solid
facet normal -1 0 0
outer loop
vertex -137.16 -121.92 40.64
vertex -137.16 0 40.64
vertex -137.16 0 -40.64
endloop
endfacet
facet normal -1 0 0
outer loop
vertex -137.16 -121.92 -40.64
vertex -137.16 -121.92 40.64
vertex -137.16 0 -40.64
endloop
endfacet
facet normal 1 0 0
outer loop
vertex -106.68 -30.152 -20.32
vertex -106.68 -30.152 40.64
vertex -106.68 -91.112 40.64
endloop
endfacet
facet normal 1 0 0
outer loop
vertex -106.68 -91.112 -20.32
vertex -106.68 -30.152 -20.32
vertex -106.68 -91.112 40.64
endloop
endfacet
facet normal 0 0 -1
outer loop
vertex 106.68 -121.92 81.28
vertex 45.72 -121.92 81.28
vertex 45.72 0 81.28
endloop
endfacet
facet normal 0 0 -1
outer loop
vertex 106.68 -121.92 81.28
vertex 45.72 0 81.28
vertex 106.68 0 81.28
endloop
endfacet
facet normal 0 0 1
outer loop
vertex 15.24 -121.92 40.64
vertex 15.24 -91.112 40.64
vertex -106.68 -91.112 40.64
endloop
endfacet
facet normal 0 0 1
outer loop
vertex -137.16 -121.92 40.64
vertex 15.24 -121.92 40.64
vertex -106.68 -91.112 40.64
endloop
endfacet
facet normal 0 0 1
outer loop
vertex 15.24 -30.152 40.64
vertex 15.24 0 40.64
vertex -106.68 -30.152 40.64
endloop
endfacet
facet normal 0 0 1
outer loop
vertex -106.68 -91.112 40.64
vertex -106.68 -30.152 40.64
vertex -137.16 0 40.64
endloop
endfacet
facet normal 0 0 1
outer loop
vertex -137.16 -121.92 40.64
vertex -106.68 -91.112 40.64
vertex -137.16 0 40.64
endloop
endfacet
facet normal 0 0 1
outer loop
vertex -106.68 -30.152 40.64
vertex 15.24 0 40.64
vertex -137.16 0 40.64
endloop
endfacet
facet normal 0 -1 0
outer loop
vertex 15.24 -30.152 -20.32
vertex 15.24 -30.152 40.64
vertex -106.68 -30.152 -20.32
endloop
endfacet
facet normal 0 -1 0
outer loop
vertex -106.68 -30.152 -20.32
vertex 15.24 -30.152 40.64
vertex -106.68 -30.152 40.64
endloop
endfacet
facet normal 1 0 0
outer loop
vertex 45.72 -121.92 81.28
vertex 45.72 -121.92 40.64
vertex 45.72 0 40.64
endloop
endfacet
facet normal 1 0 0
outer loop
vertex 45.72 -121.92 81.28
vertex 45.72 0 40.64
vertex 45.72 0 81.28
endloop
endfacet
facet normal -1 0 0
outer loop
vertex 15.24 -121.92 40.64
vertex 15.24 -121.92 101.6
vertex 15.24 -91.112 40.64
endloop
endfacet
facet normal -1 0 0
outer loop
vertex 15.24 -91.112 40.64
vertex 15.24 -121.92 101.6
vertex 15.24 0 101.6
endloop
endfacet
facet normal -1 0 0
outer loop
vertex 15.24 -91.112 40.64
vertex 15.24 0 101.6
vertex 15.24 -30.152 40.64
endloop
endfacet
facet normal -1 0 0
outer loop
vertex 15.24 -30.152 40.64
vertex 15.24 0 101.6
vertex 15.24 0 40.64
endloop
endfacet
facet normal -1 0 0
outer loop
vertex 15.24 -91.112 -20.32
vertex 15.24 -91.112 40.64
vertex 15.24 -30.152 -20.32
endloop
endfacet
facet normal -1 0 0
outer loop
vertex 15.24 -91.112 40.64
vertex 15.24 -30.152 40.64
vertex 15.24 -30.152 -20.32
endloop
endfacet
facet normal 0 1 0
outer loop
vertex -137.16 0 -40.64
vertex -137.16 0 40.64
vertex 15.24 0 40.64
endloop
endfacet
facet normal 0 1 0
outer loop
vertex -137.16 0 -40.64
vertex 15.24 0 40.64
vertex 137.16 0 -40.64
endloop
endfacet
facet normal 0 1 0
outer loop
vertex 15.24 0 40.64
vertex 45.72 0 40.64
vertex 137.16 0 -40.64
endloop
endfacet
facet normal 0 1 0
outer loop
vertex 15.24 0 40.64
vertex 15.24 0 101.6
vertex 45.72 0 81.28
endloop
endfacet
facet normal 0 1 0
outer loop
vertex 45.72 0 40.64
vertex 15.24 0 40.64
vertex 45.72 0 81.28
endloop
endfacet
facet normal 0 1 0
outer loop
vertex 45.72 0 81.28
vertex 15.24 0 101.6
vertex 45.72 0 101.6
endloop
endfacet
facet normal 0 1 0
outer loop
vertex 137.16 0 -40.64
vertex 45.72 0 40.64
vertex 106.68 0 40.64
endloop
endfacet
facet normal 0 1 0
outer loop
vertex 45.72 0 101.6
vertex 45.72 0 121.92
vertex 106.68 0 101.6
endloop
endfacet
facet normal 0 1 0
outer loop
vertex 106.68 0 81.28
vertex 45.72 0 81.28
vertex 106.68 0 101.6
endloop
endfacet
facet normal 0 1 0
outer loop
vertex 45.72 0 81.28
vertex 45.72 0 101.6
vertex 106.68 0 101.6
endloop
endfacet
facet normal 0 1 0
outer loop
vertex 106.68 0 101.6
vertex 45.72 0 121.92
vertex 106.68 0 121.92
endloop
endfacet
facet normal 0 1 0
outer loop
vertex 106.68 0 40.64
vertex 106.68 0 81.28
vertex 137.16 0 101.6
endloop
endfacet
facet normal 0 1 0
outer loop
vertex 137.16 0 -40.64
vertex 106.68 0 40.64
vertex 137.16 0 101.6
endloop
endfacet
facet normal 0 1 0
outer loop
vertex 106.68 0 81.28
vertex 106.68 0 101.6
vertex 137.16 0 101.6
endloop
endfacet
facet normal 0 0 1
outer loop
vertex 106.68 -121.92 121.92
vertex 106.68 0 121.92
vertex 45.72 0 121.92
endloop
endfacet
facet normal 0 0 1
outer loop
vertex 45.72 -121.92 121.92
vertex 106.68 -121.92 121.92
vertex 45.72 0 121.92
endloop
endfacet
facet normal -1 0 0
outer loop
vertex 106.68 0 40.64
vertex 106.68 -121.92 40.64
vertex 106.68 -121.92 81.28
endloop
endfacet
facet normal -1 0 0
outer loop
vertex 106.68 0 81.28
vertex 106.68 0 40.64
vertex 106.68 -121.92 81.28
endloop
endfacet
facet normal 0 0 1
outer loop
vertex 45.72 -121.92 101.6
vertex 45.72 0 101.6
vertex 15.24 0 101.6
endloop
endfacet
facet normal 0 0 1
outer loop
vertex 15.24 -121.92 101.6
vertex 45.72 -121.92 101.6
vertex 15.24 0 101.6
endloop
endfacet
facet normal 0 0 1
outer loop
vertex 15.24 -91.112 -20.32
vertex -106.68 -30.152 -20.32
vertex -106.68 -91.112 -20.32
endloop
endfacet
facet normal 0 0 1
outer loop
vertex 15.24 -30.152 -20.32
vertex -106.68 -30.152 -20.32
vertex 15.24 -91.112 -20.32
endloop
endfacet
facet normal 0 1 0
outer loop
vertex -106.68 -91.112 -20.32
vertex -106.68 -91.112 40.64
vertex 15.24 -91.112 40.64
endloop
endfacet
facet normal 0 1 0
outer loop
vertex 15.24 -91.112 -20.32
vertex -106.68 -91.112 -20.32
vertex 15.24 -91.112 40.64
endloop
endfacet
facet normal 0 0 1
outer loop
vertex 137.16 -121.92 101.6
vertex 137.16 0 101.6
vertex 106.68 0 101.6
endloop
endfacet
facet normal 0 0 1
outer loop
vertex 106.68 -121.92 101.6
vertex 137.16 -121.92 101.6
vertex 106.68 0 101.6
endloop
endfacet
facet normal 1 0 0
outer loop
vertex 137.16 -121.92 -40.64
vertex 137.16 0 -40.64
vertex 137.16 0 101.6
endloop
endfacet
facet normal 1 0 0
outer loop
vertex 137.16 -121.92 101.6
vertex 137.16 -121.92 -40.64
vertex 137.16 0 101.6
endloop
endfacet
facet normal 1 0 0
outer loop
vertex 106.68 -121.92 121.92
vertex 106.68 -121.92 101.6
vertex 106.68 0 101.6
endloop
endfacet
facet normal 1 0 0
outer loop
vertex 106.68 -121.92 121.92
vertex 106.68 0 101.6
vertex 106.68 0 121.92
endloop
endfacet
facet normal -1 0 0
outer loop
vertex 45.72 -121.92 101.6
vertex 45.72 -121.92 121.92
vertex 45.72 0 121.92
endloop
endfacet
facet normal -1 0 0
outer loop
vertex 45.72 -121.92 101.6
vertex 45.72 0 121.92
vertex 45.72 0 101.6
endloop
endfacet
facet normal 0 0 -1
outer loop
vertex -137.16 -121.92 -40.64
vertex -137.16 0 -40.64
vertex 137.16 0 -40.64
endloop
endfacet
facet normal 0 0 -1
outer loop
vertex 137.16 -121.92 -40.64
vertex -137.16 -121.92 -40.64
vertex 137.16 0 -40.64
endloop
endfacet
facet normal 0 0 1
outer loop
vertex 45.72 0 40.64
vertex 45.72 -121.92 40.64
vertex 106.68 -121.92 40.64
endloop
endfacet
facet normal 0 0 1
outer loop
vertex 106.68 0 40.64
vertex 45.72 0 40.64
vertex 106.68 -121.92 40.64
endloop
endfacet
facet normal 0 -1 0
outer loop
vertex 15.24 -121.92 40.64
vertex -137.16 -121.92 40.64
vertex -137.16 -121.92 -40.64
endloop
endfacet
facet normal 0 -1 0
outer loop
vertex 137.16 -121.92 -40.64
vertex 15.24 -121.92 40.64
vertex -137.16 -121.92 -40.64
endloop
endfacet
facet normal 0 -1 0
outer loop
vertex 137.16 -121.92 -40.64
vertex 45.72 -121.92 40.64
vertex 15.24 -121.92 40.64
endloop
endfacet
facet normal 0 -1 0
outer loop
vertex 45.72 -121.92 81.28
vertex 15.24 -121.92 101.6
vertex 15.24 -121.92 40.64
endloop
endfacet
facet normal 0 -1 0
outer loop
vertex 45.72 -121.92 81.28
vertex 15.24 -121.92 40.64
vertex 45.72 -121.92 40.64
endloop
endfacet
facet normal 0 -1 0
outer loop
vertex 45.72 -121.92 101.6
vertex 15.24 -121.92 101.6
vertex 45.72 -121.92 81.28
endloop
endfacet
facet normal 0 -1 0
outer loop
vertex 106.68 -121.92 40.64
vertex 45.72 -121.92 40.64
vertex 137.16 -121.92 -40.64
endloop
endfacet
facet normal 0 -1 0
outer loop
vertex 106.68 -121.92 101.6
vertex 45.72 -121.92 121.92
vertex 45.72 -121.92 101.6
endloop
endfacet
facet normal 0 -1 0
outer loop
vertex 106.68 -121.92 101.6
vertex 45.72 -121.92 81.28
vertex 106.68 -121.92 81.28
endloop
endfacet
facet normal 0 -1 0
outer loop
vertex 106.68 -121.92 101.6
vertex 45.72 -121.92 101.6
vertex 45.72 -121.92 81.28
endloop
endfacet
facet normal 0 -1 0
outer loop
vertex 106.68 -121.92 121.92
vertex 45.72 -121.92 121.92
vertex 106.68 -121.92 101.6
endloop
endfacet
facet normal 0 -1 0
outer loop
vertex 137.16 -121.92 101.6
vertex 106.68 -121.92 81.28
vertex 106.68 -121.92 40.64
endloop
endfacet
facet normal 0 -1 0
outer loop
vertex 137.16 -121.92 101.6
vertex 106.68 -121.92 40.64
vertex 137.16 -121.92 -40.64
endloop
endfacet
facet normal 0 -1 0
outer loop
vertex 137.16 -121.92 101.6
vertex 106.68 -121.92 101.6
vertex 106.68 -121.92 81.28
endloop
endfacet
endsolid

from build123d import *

# Parameters (mm, degrees)
F1_DEPTH = 121.92
F3_DEPTH = 60.96
F4_W     = 60.96
F4_H     = 40.64
F5_DEPTH = 121.921


with BuildPart() as f1:
    # F0 (on Front) → F1 (new body)
    with BuildSketch(Plane.XZ):
        Polygon((137.16, -40.64), (137.16, 40.64), (15.24, 40.64), (-137.16, 40.64), (-137.16, -40.64), align=None)
        Polygon((15.24, 40.64), (137.16, 40.64), (137.16, 101.6), (106.68, 101.6), (106.68, 121.92), (45.72, 121.92), (45.72, 101.6), (15.24, 101.6), align=None)
    extrude(amount=F1_DEPTH)

    # F2 (on face) → F3 (cut)
    with BuildSketch(Plane.XY.offset(40.64)):
        Polygon((15.24, -91.111548), (15.24, -30.151548), (-45.72, -30.151548), (-106.68, -30.151548), (-106.68, -91.111548), align=None)
    extrude(amount=-F3_DEPTH, mode=Mode.SUBTRACT)

    # F4 (on face) → F5 (cut, through all)
    with BuildSketch(Plane.XZ.offset(121.92)):
        with Locations((76.2, 60.96)):
            Rectangle(F4_W, F4_H)
    extrude(amount=-F5_DEPTH, mode=Mode.SUBTRACT)


solid = f1.part
